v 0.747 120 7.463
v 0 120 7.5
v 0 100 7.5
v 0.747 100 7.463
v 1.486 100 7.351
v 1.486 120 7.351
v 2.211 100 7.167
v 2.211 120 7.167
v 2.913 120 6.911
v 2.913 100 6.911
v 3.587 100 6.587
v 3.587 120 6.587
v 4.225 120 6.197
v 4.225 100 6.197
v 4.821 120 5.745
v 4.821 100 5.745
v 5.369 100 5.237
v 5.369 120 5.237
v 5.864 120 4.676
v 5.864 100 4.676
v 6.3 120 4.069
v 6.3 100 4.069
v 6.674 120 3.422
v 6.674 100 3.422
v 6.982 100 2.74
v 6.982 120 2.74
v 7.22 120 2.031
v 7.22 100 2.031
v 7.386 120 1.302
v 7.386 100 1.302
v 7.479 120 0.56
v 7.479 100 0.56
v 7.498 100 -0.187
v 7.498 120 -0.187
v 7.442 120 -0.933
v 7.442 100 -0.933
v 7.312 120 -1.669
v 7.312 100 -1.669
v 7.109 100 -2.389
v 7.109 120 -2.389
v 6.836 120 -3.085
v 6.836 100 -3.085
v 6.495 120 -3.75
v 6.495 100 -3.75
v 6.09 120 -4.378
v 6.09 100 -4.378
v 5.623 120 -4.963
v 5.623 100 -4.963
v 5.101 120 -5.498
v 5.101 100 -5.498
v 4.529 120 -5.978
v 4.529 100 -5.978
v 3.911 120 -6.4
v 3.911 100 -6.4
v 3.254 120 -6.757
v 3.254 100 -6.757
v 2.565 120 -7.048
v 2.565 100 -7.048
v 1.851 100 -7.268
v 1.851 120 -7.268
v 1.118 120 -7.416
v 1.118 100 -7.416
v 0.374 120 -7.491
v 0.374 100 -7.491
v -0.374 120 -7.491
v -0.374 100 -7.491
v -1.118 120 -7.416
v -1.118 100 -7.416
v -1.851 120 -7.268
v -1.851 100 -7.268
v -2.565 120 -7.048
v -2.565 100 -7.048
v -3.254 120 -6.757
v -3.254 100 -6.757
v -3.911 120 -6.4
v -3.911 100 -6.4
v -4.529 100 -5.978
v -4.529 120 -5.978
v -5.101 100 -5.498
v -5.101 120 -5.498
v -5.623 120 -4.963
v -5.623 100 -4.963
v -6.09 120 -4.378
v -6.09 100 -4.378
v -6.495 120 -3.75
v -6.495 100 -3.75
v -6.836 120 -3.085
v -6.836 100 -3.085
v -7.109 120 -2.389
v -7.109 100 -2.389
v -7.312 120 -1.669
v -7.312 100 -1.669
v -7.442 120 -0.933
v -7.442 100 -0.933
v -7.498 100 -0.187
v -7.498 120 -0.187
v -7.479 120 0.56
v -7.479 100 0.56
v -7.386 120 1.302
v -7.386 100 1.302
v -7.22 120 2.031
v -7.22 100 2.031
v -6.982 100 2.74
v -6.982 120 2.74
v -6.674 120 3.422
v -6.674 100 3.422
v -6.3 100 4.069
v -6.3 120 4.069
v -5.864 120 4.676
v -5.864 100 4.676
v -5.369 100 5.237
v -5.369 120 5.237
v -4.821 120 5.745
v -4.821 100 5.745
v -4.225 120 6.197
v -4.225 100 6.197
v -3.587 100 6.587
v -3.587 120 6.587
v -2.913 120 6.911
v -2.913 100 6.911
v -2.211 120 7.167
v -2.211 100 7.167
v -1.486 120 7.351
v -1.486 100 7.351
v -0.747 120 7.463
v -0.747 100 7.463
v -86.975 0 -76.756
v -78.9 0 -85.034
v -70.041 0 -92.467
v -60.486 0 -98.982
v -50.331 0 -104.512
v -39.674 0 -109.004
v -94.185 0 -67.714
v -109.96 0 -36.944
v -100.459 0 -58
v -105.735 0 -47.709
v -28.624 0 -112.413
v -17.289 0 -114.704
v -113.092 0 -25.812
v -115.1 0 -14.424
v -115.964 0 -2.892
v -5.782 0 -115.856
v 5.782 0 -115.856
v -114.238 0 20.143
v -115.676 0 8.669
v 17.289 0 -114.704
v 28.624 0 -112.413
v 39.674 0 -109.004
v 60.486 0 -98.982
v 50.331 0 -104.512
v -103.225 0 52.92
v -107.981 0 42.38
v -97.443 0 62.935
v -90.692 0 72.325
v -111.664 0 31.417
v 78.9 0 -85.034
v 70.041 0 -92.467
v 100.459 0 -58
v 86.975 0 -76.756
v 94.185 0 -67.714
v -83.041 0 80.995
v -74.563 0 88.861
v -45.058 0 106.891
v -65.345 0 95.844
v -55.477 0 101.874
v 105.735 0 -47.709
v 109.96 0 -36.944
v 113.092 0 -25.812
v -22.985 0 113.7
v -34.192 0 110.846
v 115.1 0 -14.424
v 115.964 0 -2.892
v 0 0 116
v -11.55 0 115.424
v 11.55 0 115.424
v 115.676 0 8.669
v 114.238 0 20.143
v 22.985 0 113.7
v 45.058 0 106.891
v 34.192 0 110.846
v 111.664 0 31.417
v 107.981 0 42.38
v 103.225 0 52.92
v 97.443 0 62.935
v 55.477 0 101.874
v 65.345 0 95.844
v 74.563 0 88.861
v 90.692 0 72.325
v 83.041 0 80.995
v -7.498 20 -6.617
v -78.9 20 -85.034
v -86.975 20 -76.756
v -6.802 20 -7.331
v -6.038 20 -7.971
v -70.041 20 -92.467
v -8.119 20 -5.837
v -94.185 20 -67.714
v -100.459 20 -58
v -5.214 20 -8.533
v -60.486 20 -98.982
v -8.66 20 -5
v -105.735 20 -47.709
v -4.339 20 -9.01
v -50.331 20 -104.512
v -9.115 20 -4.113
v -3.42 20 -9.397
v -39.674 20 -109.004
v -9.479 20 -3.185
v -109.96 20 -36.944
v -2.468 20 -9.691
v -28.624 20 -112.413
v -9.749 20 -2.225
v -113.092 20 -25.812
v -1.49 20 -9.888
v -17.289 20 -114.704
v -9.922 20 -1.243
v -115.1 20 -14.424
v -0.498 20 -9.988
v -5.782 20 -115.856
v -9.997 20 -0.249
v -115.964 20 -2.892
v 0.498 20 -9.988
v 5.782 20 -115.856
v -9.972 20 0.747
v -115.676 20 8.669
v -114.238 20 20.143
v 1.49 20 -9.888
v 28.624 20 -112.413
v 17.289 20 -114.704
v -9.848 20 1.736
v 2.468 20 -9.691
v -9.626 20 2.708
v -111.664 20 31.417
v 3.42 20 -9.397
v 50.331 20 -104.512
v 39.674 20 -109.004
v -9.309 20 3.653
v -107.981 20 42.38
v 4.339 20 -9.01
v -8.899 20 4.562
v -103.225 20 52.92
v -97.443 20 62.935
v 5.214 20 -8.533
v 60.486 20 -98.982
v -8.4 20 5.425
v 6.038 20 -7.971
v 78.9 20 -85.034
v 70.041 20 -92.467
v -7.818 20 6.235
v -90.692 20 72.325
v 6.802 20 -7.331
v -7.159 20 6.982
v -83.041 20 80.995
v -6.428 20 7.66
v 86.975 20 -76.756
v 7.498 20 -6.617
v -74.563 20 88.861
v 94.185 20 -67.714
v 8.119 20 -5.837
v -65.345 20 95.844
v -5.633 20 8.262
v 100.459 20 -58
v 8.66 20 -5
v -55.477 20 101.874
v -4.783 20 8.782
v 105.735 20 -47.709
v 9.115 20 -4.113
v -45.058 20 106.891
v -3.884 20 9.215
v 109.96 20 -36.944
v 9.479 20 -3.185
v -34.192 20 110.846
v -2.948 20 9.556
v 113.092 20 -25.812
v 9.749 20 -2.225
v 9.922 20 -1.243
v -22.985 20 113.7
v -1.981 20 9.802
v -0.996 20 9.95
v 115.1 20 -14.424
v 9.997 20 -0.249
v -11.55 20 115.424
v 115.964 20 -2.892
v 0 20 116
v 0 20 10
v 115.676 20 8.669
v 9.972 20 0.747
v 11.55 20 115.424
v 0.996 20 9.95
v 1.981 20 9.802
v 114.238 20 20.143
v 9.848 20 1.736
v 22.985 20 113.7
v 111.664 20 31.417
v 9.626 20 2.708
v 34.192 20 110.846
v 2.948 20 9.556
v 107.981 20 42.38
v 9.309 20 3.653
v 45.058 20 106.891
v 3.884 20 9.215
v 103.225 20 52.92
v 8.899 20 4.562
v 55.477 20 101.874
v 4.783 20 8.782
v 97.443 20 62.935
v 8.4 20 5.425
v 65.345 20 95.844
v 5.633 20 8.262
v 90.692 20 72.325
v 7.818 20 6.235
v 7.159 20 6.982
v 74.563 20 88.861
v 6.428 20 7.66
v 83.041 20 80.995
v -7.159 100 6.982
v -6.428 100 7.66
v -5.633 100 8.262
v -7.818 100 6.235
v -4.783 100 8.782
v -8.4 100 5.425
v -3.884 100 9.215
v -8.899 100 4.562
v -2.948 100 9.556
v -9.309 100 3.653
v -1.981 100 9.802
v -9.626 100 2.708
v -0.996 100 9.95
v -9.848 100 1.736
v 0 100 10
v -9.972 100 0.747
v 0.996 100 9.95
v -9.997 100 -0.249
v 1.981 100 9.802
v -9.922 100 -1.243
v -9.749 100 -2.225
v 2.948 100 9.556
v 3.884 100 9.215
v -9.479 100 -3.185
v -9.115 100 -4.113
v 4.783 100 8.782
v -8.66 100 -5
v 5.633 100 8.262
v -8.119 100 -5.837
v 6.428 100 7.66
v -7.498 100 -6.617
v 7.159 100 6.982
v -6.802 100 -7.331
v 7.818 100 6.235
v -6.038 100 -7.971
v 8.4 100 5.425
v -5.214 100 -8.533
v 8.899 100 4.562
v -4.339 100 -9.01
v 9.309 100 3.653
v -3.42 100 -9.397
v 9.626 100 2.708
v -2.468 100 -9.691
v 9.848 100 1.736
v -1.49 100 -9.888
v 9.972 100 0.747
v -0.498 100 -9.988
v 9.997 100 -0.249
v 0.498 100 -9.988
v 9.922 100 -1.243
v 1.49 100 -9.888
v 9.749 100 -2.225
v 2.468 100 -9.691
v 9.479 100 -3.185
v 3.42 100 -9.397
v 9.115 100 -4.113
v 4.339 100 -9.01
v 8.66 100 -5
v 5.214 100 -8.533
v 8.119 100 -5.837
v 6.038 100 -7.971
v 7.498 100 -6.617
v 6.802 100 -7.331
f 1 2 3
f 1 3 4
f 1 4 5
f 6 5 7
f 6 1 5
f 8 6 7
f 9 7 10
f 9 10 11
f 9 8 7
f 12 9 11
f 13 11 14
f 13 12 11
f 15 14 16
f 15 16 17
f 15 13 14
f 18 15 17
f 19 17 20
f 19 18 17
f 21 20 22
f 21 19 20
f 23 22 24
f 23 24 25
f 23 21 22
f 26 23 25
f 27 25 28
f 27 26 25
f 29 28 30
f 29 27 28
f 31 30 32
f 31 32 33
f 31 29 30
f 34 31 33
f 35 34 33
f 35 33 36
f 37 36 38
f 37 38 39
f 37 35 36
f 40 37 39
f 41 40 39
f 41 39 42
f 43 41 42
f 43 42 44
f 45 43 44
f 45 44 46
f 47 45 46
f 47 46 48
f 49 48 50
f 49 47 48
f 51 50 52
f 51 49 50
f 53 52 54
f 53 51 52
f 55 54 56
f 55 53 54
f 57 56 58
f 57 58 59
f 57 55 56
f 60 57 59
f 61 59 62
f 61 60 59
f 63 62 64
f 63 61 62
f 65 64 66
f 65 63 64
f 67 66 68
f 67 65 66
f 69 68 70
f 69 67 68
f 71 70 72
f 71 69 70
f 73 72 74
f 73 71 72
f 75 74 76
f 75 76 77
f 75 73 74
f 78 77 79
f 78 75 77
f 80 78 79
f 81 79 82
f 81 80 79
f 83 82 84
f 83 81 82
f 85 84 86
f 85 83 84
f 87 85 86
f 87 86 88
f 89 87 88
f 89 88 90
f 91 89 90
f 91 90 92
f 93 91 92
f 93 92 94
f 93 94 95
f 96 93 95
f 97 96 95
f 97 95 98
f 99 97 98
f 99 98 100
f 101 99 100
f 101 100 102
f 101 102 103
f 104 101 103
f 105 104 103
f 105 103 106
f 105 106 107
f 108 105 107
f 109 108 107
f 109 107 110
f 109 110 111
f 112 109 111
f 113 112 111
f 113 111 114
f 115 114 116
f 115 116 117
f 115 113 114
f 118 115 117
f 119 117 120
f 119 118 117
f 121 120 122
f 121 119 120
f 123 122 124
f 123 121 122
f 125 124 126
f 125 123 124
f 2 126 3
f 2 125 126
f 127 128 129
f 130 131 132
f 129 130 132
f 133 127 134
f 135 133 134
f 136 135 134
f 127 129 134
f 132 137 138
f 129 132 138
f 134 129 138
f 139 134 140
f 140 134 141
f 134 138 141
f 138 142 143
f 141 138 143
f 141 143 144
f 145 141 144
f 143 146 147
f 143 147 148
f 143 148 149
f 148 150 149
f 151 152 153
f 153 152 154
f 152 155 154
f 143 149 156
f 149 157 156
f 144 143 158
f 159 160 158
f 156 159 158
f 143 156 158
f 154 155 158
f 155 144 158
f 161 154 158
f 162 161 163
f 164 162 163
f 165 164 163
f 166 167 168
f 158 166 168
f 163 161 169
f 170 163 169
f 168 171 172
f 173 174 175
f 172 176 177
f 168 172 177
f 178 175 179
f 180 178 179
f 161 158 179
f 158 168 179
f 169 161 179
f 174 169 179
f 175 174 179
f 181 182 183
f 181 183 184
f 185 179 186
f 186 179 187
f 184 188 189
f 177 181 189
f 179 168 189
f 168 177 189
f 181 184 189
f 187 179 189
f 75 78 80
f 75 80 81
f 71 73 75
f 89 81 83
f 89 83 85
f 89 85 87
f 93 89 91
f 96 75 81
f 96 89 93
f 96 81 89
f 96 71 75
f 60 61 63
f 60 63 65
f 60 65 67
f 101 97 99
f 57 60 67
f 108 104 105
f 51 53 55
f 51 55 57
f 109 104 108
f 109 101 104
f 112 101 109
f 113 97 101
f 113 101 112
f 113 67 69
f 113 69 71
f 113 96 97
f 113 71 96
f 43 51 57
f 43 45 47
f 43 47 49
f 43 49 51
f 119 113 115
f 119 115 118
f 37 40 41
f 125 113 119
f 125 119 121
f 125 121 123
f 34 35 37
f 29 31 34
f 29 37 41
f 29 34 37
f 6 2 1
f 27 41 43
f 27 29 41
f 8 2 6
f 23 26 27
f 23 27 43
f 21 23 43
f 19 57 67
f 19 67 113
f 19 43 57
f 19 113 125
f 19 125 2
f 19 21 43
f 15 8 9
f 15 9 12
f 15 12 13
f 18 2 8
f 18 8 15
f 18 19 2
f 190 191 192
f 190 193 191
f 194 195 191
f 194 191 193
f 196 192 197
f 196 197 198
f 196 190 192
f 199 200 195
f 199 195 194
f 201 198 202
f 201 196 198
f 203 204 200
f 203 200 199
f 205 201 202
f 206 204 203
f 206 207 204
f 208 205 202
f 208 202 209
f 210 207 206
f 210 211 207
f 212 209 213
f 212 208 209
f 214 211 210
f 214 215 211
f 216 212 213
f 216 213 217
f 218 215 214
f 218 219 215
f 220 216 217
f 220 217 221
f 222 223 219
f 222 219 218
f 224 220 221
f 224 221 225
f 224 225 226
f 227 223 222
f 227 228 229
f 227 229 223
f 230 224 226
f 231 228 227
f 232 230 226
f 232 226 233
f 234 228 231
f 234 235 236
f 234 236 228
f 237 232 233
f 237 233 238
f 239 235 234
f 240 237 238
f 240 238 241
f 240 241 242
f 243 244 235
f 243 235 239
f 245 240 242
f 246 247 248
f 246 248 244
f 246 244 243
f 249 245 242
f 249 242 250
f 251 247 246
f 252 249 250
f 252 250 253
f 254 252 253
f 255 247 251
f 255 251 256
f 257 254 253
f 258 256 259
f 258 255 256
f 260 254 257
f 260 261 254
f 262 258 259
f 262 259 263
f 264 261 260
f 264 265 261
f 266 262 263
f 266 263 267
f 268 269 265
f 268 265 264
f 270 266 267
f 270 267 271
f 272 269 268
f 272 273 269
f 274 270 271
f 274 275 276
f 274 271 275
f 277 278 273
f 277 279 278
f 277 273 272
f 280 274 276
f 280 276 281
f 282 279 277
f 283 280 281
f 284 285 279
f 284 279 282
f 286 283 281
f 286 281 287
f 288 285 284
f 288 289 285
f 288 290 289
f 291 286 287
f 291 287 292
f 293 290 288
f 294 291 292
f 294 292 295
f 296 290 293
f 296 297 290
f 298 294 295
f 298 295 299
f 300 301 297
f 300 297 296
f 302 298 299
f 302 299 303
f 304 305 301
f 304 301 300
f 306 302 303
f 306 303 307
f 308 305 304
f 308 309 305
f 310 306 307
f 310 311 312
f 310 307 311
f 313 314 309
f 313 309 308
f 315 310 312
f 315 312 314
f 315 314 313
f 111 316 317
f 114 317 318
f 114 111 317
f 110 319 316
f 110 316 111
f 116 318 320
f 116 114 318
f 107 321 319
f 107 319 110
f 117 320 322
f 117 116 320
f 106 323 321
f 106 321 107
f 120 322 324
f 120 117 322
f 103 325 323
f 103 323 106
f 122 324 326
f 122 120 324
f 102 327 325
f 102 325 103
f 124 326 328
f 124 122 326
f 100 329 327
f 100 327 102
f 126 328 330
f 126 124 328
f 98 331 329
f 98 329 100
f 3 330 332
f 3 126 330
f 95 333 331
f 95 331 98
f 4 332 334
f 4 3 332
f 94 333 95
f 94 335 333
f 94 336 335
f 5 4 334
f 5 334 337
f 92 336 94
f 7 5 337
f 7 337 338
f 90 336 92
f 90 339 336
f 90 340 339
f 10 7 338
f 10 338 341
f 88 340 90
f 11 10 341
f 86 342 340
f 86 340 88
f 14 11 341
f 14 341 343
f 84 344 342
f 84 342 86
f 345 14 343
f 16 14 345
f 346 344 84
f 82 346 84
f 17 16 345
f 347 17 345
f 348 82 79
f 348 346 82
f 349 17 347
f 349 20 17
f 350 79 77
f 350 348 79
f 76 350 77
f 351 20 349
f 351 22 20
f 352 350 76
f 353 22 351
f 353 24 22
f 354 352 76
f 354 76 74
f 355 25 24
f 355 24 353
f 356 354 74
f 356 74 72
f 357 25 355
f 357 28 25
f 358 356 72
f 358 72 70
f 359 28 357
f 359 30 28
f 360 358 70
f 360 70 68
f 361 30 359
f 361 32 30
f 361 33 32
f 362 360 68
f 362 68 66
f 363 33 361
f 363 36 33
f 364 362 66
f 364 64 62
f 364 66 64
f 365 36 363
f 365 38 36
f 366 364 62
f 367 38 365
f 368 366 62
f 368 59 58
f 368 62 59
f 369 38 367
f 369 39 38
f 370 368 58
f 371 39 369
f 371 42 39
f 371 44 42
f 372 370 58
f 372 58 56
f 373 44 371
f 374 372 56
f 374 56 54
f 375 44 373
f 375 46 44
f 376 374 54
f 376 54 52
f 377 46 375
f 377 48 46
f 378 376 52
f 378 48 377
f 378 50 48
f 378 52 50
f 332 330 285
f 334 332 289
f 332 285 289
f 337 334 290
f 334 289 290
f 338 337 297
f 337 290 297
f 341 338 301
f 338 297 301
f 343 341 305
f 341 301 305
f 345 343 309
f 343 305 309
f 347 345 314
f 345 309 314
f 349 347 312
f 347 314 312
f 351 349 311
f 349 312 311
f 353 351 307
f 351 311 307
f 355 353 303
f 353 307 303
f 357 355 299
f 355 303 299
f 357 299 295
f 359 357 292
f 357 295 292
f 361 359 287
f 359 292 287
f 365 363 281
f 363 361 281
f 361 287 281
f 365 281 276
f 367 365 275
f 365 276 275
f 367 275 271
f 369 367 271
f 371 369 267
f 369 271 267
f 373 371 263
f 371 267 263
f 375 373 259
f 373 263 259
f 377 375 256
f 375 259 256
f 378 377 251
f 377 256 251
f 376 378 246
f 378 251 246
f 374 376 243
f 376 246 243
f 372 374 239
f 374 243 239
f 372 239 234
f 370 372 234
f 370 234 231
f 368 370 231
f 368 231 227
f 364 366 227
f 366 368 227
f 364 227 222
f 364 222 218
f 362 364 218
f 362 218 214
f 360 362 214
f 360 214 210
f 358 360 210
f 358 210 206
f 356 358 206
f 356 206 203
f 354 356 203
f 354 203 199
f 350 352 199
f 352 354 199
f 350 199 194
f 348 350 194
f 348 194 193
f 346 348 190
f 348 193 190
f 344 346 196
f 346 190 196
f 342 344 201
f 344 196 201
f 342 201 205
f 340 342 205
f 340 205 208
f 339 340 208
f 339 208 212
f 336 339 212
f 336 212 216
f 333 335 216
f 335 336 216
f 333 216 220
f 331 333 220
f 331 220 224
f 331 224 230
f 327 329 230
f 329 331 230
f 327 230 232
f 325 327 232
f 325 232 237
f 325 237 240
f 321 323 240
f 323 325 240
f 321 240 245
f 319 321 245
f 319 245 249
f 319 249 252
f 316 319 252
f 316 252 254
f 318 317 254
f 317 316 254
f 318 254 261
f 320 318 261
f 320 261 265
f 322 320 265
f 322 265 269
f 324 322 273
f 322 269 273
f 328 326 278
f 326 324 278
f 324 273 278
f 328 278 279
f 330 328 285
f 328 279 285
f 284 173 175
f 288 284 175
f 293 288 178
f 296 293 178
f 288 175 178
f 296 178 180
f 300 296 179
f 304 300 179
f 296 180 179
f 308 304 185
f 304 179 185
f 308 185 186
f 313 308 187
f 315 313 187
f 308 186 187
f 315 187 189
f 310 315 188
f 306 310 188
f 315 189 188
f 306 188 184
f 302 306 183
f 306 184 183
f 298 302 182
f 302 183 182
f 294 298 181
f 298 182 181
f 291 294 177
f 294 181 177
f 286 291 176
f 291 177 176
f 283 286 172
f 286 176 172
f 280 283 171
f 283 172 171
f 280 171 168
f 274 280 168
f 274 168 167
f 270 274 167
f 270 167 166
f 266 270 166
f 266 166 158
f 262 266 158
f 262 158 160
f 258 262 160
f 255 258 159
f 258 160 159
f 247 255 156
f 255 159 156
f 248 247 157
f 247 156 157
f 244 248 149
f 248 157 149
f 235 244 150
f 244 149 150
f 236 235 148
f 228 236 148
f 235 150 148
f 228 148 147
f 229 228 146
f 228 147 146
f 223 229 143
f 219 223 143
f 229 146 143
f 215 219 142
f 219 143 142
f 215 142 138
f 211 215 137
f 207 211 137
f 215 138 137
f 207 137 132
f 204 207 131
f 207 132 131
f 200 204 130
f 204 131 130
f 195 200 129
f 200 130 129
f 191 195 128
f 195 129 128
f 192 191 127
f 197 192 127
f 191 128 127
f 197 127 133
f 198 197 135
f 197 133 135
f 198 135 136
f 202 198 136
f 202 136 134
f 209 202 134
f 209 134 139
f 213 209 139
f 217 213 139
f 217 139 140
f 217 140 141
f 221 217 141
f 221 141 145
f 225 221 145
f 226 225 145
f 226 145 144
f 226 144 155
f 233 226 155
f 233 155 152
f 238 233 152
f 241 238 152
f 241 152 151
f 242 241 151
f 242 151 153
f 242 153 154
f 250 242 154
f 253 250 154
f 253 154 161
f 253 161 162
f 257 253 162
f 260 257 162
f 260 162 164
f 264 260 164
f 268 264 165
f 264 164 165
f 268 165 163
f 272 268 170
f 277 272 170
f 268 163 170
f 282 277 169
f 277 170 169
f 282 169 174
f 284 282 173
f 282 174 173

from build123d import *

# Parameters (mm, degrees)
SKETCH1_R           = 116
BOSS_EXTRUDE1_DEPTH = 20
SKETCH2_R           = 10
BOSS_EXTRUDE2_DEPTH = 100
SKETCH3_OUTSIDE_W   = 303.87
SKETCH3_OUTSIDE_H   = 303.87
SKETCH3_OUTSIDE_R   = 7.5
CUT_EXTRUDE1_DEPTH  = 20


with BuildPart() as part:
    # Sketch1 → Boss-Extrude1 (new body)
    with BuildSketch(Plane(origin=(0, 0, 0), x_dir=(1, 0, 0), z_dir=(0, 1, 0))):
        with Locations(Location((0, 0, 0), (0, 0, 270))):
            Circle(SKETCH1_R)
    extrude(amount=BOSS_EXTRUDE1_DEPTH)

    # Sketch2 → Boss-Extrude2 (add)
    with BuildSketch(Plane(origin=(0, 20, 0), x_dir=(1, 0, 0), z_dir=(0, 1, 0))):
        with Locations(Location((0, 0, 0), (0, 0, 270))):
            Circle(SKETCH2_R)
    extrude(amount=BOSS_EXTRUDE2_DEPTH)

    # Sketch3 outside → Cut-Extrude1 (cut)
    with BuildSketch(Plane(origin=(0, 120, 0), x_dir=(1, 0, 0), z_dir=(0, 1, 0))):
        Rectangle(SKETCH3_OUTSIDE_W, SKETCH3_OUTSIDE_H)
        with Locations(Location((0, 0, 0), (0, 0, 270))):
            Circle(SKETCH3_OUTSIDE_R, mode=Mode.SUBTRACT)
    extrude(amount=-CUT_EXTRUDE1_DEPTH, mode=Mode.SUBTRACT)


solid = part.part
